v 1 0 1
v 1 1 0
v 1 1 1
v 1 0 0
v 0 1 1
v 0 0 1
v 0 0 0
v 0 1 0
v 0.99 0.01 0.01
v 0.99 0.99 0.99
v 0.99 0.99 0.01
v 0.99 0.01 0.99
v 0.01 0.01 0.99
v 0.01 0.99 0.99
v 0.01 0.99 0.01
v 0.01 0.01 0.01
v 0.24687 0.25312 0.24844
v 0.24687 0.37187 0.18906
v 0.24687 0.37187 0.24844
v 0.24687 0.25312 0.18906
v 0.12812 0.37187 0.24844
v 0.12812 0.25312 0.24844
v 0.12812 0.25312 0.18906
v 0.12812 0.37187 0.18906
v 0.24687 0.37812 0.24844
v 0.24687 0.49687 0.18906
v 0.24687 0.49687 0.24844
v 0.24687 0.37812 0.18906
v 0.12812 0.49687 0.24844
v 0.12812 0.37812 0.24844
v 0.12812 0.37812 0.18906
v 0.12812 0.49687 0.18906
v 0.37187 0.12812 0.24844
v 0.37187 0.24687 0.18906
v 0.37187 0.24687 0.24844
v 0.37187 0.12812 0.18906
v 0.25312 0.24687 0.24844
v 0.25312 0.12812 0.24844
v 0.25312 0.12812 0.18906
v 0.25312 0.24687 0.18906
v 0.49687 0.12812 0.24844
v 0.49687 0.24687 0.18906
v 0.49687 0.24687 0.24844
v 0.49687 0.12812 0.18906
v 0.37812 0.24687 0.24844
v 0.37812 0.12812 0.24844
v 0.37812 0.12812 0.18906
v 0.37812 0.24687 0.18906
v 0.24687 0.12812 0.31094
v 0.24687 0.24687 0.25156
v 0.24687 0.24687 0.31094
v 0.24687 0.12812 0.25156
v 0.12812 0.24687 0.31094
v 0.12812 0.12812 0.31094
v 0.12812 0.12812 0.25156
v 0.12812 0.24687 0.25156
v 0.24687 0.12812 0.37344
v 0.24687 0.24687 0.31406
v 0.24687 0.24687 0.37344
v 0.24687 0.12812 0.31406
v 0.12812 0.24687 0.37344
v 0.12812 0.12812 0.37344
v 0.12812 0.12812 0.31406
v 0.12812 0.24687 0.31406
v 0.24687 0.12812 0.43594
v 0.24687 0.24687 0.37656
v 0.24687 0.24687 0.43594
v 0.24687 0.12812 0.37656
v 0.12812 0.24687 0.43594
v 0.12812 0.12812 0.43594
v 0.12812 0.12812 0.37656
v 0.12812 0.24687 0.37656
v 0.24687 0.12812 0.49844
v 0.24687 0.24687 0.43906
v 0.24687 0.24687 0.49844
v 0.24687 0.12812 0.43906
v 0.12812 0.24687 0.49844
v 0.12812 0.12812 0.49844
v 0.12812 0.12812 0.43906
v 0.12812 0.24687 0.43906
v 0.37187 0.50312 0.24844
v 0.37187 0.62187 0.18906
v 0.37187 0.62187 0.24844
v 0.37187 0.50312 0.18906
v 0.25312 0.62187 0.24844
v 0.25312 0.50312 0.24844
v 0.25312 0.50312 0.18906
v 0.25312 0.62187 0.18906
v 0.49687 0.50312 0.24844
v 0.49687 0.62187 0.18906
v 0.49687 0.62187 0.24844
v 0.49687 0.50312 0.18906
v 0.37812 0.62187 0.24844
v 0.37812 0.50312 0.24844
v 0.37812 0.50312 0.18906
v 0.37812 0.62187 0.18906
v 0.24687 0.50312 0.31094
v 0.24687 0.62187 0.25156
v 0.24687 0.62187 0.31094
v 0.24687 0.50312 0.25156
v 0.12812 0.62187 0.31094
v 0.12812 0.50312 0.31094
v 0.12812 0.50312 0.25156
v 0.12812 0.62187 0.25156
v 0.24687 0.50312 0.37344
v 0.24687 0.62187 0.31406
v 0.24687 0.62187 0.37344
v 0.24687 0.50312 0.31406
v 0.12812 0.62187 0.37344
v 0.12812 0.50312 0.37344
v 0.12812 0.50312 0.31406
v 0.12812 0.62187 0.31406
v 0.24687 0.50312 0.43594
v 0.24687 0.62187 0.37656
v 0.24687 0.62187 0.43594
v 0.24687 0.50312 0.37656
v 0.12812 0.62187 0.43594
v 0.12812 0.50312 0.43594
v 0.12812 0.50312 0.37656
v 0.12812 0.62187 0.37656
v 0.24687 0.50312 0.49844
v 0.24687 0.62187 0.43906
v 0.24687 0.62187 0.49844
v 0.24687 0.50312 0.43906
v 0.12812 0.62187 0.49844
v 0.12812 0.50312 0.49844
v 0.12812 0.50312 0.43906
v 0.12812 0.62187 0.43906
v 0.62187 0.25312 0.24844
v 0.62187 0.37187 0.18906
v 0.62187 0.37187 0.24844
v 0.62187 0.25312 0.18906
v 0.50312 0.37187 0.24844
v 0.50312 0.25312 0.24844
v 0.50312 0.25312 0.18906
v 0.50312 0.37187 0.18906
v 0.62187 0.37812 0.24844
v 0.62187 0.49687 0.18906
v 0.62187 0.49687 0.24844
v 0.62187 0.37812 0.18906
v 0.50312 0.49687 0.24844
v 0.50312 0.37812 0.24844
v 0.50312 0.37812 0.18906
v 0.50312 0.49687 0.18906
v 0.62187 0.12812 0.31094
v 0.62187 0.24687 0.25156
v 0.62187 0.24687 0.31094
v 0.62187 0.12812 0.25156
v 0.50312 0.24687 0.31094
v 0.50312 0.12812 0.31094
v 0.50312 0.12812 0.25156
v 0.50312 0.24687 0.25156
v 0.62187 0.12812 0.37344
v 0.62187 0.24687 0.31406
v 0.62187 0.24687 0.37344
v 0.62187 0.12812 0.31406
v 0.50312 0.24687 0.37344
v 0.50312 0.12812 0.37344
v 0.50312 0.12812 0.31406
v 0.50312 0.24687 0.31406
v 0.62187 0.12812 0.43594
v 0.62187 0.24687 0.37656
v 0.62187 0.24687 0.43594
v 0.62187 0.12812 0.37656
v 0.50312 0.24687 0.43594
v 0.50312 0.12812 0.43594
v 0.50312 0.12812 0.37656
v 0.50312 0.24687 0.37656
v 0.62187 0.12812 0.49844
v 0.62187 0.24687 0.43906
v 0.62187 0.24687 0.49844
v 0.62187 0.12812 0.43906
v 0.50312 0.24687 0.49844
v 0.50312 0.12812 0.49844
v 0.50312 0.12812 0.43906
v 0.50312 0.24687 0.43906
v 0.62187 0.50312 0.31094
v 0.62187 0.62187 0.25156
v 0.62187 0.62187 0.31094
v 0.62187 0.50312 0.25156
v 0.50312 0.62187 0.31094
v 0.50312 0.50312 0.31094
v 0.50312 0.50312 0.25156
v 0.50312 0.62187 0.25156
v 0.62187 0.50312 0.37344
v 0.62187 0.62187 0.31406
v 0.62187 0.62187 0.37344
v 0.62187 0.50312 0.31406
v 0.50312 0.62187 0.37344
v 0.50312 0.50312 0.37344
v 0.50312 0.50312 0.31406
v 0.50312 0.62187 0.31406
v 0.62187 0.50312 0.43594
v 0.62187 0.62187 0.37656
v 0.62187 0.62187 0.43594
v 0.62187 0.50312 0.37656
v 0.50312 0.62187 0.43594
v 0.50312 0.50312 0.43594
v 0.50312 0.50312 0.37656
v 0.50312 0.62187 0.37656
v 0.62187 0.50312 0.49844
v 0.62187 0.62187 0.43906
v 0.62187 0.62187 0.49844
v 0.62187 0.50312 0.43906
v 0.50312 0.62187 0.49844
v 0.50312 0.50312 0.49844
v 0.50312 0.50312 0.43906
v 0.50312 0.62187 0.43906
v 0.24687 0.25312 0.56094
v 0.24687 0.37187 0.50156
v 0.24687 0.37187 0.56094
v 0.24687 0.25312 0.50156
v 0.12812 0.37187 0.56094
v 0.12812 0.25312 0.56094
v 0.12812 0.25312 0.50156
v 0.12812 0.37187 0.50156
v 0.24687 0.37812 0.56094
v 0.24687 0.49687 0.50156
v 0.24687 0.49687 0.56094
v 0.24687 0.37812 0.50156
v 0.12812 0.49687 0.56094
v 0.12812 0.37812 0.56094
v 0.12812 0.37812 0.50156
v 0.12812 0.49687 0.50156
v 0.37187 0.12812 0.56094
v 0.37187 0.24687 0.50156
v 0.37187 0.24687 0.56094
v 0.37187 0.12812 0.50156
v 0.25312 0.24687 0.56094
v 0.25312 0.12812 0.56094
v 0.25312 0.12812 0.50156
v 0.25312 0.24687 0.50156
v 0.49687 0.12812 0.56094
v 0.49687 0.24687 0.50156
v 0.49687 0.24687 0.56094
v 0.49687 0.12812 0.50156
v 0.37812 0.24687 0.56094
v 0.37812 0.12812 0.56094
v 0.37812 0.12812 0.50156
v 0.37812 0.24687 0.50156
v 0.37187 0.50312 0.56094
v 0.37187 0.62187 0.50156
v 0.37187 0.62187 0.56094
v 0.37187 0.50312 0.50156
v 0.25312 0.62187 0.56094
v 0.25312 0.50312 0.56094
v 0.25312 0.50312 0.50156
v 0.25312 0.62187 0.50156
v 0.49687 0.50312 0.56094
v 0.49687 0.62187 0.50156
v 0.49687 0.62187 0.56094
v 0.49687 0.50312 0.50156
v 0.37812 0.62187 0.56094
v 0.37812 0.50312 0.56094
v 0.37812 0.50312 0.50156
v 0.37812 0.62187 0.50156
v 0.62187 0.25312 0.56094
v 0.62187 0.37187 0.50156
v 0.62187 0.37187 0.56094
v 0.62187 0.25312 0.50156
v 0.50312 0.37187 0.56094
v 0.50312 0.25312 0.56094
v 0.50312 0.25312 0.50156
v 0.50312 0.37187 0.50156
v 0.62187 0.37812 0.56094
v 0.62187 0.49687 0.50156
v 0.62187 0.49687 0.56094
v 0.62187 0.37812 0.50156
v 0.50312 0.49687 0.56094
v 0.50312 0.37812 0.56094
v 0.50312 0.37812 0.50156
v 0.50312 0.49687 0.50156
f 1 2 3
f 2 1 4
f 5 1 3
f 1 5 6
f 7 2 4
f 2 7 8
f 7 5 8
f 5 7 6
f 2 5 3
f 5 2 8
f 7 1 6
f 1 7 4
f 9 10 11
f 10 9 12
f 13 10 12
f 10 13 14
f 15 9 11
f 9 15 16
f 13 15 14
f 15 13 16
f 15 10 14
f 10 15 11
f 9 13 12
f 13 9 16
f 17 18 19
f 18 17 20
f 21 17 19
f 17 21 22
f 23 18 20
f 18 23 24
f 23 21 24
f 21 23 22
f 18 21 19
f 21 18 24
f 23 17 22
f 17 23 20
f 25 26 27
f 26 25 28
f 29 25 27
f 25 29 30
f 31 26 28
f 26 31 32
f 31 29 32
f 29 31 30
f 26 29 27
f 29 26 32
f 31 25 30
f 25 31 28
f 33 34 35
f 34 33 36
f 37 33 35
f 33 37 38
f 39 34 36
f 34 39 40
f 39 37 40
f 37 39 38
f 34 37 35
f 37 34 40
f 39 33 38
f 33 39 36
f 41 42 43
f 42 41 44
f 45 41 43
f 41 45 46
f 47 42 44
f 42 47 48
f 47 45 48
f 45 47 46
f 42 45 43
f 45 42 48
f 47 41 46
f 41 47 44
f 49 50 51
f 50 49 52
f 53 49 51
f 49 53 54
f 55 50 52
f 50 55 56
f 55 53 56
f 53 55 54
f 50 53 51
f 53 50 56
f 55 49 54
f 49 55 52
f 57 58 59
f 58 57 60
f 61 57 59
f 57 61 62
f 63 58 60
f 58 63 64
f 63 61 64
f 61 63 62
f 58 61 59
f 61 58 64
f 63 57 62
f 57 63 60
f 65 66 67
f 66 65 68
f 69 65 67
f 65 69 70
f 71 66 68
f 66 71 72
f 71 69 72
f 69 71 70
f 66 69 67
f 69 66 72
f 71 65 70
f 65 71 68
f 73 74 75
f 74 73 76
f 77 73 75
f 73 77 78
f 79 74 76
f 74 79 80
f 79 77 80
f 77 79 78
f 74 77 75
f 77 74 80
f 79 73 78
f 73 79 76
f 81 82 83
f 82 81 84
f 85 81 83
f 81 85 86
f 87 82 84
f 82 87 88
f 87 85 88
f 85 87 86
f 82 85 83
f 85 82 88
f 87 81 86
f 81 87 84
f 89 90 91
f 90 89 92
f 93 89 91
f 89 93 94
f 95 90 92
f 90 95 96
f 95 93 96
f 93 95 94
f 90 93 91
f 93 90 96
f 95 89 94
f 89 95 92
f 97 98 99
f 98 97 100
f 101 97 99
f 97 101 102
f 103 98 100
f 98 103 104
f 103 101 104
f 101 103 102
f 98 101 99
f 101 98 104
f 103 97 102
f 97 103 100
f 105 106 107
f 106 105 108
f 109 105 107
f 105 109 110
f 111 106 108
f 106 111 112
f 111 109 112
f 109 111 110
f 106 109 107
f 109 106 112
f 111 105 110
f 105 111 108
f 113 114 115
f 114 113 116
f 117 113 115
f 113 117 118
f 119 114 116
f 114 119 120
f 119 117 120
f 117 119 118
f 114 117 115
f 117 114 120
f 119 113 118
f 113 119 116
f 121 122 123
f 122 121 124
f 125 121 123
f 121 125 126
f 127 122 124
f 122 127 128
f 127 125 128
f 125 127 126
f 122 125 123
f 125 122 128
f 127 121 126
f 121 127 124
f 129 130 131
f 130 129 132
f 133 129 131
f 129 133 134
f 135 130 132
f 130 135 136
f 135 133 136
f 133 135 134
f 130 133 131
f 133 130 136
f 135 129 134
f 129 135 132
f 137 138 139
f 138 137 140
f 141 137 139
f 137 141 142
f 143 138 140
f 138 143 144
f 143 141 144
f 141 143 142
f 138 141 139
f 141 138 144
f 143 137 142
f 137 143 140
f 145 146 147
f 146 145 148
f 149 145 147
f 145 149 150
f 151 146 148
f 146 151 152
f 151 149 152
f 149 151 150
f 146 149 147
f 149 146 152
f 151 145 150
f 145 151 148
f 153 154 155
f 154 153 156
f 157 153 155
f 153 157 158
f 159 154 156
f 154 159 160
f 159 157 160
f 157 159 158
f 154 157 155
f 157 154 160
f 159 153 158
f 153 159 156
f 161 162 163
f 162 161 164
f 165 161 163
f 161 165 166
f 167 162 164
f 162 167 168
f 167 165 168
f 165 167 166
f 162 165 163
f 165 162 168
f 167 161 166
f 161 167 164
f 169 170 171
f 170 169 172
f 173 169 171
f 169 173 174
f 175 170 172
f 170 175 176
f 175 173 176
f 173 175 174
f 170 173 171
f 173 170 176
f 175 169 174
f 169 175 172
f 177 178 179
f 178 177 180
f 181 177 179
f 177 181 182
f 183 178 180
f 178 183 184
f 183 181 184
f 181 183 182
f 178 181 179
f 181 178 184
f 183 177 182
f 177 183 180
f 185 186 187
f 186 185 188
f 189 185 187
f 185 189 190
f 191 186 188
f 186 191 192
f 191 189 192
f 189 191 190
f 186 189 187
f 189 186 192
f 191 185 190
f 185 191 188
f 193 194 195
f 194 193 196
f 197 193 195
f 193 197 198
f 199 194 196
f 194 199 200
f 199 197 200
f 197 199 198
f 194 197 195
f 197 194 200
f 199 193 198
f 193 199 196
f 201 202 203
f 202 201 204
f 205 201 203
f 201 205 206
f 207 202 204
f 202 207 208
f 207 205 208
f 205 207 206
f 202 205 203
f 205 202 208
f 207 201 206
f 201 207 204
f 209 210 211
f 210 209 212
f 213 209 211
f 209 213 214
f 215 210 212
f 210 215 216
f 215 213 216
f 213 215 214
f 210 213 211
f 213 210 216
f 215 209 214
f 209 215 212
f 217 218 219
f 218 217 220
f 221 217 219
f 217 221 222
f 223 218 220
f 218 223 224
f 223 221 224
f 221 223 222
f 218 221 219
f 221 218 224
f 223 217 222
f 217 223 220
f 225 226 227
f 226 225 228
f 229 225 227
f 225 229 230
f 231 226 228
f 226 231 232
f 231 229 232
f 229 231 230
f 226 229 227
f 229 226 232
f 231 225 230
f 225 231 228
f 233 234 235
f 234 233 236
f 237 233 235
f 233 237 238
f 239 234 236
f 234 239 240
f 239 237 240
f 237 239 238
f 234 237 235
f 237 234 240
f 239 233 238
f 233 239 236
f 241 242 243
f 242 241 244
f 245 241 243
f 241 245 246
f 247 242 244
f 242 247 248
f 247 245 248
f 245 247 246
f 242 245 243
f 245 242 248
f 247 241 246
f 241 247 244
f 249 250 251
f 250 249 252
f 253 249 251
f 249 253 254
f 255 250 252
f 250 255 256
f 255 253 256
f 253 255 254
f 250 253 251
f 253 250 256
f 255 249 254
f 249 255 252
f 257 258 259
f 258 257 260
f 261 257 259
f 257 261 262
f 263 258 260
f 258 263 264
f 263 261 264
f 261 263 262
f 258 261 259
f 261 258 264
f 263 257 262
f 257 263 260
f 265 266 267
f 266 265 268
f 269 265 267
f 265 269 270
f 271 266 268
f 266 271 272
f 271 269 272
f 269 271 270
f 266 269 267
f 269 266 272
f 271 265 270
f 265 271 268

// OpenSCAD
translate([0.1875, 0.3125, 0.21875]) color([0.9025192901328895, 0.2534940235896185, 0.1254769882399983]) cube([0.11875, 0.11875, 0.059375], center=true);
translate([0.1875, 0.4375, 0.21875]) color([0.5137281906098262, 0.5277406268152111, 0.7347736698500562]) cube([0.11875, 0.11875, 0.059375], center=true);
translate([0.3125, 0.1875, 0.21875]) color([0.3046460967268131, 0.7005118461700812, 0.6378907343992031]) cube([0.11875, 0.11875, 0.059375], center=true);
translate([0.4375, 0.1875, 0.21875]) color([0.35260838796240346, 0.5445564177859429, 0.777713834144644]) cube([0.11875, 0.11875, 0.059375], center=true);
translate([0.1875, 0.1875, 0.28125]) color([0.7695225442242936, 0.4899185292348598, 0.4342402482723954]) cube([0.11875, 0.11875, 0.059375], center=true);
translate([0.1875, 0.1875, 0.34375]) color([0.7805951463390132, 0.6488392300394332, 0.14016209478920982]) cube([0.11875, 0.11875, 0.059375], center=true);
translate([0.1875, 0.1875, 0.40625]) color([0.22080025055509922, 0.8907883163777, 0.7123935546595411]) cube([0.11875, 0.11875, 0.059375], center=true);
translate([0.1875, 0.1875, 0.46875]) color([0.26279572537860363, 0.1968801911941831, 0.7356814490266124]) cube([0.11875, 0.11875, 0.059375], center=true);
translate([0.3125, 0.5625, 0.21875]) color([0.977513822699392, 0.6193754400986683, 0.20416048680181575]) cube([0.11875, 0.11875, 0.059375], center=true);
translate([0.4375, 0.5625, 0.21875]) color([0.31956866521385374, 0.359559942020674, 0.6388936442642901]) cube([0.11875, 0.11875, 0.059375], center=true);
translate([0.1875, 0.5625, 0.28125]) color([0.4862259103679062, 0.6542553950450076, 0.10045476415846766]) cube([0.11875, 0.11875, 0.059375], center=true);
translate([0.1875, 0.5625, 0.34375]) color([0.4059245126432023, 0.41451062153862983, 0.06329849461221715]) cube([0.11875, 0.11875, 0.059375], center=true);
translate([0.1875, 0.5625, 0.40625]) color([0.3664551531723863, 0.2854981927543221, 0.8014895404225142]) cube([0.11875, 0.11875, 0.059375], center=true);
translate([0.1875, 0.5625, 0.46875]) color([0.8858815209255528, 0.10014440522867185, 0.45499529212556356]) cube([0.11875, 0.11875, 0.059375], center=true);
translate([0.5625, 0.3125, 0.21875]) color([0.3456394297134978, 0.6369436278645819, 0.48642482304546697]) cube([0.11875, 0.11875, 0.059375], center=true);
translate([0.5625, 0.4375, 0.21875]) color([0.9616368141318057, 0.6318672838382343, 0.0047004015701775925]) cube([0.11875, 0.11875, 0.059375], center=true);
translate([0.5625, 0.1875, 0.28125]) color([0.6568812559593883, 0.05016143274555662, 0.6937913391401251]) cube([0.11875, 0.11875, 0.059375], center=true);
translate([0.5625, 0.1875, 0.34375]) color([0.48044554855871713, 0.39427178817418496, 0.9339287137797179]) cube([0.11875, 0.11875, 0.059375], center=true);
translate([0.5625, 0.1875, 0.40625]) color([0.8012693802219971, 0.7763303307091575, 0.23714690313980946]) cube([0.11875, 0.11875, 0.059375], center=true);
translate([0.5625, 0.1875, 0.46875]) color([0.7674570865378414, 0.968850342953145, 0.5050636597410237]) cube([0.11875, 0.11875, 0.059375], center=true);
translate([0.5625, 0.5625, 0.28125]) color([0.761836327869714, 0.03318651534190187, 0.38937824109545527]) cube([0.11875, 0.11875, 0.059375], center=true);
translate([0.5625, 0.5625, 0.34375]) color([0.5124484416011036, 0.30399403615365506, 0.03119044596329712]) cube([0.11875, 0.11875, 0.059375], center=true);
translate([0.5625, 0.5625, 0.40625]) color([0.5921452798814805, 0.6394179354482115, 0.31827552044466956]) cube([0.11875, 0.11875, 0.059375], center=true);
translate([0.5625, 0.5625, 0.46875]) color([0.297780150836805, 0.3846941687405786, 0.902307245355222]) cube([0.11875, 0.11875, 0.059375], center=true);
translate([0.1875, 0.3125, 0.53125]) color([0.7720879176608758, 0.4367734349010385, 0.08331865864899135]) cube([0.11875, 0.11875, 0.059375], center=true);
translate([0.1875, 0.4375, 0.53125]) color([0.8133280528690789, 0.6108079380836301, 0.9640768715347997]) cube([0.11875, 0.11875, 0.059375], center=true);
translate([0.3125, 0.1875, 0.53125]) color([0.9963370731474844, 0.4219608305719207, 0.5264501512127308]) cube([0.11875, 0.11875, 0.059375], center=true);
translate([0.4375, 0.1875, 0.53125]) color([0.7906380863092566, 0.933035385197455, 0.3814010900327123]) cube([0.11875, 0.11875, 0.059375], center=true);
translate([0.3125, 0.5625, 0.53125]) color([0.845428000439424, 0.33610482386256724, 0.13595581147446034]) cube([0.11875, 0.11875, 0.059375], center=true);
translate([0.4375, 0.5625, 0.53125]) color([0.7354904217143767, 0.4570036613331221, 0.25275232523225566]) cube([0.11875, 0.11875, 0.059375], center=true);
translate([0.5625, 0.3125, 0.53125]) color([0.264838468439516, 0.26940503822533357, 0.047824486613258776]) cube([0.11875, 0.11875, 0.059375], center=true);
translate([0.5625, 0.4375, 0.53125]) color([0.16168517043291708, 0.1932026233995816, 0.20881610840054698]) cube([0.11875, 0.11875, 0.059375], center=true);
color([0.3,0.3,0.3,0.3]) difference() { cube([1,1,1]); translate([0.01,0.01,0.01]) cube([0.98,0.98,0.98]); }
